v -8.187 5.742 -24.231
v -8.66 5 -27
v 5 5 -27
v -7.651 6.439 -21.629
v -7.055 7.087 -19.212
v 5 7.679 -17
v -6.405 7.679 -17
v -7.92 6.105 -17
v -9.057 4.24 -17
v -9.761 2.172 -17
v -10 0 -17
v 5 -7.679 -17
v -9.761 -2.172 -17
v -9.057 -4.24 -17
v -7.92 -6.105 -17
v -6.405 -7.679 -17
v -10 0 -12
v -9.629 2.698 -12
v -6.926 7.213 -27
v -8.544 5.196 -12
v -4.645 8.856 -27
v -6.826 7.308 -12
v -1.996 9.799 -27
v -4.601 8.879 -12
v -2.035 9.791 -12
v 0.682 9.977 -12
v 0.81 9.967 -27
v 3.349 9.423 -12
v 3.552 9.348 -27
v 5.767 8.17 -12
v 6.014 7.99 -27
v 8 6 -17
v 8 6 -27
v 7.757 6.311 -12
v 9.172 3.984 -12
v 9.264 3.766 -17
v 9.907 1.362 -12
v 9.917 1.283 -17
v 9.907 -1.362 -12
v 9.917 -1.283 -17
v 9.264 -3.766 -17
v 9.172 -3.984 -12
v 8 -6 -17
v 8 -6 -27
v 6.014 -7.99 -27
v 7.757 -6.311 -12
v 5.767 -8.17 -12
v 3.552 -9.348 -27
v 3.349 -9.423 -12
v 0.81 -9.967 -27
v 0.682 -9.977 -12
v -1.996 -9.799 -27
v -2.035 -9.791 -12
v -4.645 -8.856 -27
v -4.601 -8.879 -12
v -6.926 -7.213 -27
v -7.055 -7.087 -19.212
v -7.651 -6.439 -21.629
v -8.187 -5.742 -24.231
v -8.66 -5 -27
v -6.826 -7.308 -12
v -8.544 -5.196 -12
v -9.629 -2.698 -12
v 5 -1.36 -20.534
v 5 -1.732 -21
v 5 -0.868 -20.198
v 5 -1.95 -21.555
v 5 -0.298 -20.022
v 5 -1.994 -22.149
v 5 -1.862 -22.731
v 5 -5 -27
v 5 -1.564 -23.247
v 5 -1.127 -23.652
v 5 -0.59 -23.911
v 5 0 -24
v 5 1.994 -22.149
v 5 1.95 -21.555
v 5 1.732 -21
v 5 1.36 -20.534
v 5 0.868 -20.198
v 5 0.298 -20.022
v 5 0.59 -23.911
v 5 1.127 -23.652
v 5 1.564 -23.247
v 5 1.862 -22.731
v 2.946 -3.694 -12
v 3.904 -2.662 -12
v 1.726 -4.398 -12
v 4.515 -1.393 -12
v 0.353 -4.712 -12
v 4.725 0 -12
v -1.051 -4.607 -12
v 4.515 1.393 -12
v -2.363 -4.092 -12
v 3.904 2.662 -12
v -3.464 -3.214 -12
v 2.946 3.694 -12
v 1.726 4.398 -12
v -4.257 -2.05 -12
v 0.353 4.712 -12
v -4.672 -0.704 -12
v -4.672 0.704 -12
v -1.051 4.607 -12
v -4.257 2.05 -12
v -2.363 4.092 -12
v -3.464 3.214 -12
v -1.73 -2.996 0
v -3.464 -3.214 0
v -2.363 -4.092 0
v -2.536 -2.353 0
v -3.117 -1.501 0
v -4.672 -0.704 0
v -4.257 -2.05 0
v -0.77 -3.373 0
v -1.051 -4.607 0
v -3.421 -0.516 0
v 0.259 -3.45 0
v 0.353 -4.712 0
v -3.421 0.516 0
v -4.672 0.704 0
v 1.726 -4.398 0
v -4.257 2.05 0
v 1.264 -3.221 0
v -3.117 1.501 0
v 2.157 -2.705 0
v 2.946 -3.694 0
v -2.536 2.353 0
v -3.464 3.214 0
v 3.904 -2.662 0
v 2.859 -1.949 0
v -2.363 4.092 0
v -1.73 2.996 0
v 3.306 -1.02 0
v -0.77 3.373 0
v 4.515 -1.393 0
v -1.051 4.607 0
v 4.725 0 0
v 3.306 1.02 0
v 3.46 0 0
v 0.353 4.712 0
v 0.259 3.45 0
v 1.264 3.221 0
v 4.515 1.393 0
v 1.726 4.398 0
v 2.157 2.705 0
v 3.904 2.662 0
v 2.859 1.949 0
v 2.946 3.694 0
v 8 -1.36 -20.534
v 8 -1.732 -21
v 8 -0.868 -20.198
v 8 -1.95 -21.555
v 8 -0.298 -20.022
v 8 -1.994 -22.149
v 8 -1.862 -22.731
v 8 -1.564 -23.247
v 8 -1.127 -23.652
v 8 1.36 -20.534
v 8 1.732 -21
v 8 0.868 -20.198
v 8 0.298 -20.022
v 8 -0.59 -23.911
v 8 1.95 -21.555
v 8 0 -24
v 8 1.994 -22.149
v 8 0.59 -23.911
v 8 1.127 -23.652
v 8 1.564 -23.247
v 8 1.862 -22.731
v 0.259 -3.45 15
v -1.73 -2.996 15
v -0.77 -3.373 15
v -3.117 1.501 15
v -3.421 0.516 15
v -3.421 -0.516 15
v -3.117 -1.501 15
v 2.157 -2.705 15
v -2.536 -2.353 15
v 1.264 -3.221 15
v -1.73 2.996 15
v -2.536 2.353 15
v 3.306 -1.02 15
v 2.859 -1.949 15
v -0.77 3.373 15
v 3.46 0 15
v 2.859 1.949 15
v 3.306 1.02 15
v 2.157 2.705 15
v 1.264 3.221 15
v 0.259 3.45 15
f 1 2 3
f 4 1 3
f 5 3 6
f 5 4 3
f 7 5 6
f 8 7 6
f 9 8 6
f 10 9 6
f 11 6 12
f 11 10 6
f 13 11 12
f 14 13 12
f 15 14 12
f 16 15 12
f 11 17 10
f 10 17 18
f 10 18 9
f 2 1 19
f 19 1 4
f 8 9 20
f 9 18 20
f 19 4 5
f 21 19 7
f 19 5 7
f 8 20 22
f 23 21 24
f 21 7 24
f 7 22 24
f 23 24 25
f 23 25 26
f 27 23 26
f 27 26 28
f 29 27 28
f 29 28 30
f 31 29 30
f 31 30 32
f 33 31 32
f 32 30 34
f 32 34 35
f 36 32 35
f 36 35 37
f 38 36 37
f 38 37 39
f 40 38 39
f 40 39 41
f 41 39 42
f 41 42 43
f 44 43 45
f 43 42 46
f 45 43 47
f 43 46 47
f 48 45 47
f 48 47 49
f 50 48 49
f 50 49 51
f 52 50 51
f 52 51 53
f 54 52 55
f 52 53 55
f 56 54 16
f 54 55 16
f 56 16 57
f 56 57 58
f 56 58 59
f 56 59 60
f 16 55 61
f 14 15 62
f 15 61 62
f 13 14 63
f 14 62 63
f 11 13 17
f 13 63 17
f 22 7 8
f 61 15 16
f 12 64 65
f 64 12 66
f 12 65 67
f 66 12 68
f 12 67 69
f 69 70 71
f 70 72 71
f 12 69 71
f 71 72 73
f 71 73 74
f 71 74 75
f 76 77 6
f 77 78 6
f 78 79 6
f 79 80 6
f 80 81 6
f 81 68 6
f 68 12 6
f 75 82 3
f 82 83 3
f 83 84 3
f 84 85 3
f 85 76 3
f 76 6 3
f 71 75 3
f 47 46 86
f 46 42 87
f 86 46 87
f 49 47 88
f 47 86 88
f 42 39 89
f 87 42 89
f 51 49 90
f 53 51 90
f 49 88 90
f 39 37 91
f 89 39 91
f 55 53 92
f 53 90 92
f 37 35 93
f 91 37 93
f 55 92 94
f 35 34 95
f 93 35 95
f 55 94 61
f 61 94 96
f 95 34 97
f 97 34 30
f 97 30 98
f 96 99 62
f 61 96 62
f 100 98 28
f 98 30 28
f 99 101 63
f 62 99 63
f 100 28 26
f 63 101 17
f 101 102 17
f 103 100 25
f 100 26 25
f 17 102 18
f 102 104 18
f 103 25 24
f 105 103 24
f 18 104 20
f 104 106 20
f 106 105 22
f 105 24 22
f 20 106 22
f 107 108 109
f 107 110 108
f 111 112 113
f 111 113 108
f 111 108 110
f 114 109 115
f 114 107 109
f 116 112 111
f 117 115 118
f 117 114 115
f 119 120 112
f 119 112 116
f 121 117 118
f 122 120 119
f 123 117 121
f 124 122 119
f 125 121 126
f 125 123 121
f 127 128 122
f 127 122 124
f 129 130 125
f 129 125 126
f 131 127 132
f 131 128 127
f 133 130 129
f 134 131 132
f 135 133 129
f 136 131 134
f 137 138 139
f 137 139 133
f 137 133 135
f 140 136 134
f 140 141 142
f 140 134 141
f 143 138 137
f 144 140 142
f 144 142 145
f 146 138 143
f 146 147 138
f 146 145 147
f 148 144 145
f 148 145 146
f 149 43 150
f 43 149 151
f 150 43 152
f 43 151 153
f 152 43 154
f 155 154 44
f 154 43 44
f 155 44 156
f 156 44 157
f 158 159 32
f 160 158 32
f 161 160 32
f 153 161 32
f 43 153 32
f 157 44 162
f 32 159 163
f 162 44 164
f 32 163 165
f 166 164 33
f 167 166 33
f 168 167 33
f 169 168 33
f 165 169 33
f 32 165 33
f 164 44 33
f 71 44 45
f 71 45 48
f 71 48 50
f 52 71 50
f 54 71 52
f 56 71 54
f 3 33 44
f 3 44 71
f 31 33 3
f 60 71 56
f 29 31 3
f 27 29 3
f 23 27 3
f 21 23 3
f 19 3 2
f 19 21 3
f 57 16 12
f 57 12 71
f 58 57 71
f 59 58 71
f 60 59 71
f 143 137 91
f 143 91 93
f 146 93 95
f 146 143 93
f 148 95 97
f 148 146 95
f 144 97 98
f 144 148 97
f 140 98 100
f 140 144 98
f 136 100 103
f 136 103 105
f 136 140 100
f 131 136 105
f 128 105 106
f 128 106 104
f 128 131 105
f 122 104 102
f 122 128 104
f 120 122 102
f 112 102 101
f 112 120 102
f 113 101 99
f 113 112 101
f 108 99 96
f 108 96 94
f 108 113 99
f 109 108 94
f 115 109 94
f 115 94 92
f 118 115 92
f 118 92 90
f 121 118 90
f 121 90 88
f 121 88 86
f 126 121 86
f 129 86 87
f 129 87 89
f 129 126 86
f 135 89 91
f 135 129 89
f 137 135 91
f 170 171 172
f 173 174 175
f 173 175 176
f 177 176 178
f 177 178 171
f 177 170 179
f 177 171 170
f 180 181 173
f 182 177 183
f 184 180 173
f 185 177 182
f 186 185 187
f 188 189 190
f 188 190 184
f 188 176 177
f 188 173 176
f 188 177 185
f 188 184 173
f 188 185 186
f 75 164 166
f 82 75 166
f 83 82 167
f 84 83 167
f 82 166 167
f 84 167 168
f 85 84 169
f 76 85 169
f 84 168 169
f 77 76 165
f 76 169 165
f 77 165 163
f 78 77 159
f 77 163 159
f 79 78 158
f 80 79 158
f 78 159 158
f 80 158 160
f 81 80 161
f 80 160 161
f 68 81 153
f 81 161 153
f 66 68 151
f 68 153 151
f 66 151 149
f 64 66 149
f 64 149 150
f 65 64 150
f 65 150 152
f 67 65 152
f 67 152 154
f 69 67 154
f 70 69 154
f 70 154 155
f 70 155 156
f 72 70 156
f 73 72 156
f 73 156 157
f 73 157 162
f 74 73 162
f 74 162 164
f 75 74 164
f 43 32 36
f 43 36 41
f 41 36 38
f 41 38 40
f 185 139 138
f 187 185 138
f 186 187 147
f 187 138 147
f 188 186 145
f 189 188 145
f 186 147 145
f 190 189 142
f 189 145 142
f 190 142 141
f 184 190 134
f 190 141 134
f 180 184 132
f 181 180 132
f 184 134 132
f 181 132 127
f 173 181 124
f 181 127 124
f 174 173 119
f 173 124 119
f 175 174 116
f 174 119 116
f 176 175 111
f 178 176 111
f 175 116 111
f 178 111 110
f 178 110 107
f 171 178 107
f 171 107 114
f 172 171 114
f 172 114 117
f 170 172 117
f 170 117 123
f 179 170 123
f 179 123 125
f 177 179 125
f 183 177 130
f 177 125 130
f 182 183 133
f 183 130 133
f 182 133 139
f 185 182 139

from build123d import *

# Parameters (mm, degrees)
SKETCH1_R               = 4.725
BOSS_EXTRUDE1_DEPTH     = 12
SKETCH2_R               = 3.46
BOSS_EXTRUDE2_DEPTH     = 15
SKETCH5_R               = 10
BOSS_EXTRUDE3_DEPTH     = 15
CUT_EXTRUDE1_DEPTH      = 5
CUT_EXTRUDE1_DEPTH_BACK = 15
SKETCH4_W               = 2
SKETCH4_H               = 12
CUT_EXTRUDE2_DEPTH      = 10
CUT_EXTRUDE3_REACH      = 35.956
SKETCH6_R               = 2


with BuildPart() as part:
    # Sketch1 → Boss-Extrude1 (new body)
    with BuildSketch(Plane.XY):
        Circle(SKETCH1_R)
    extrude(amount=-BOSS_EXTRUDE1_DEPTH)

    # Sketch2 → Boss-Extrude2 (add)
    with BuildSketch(Plane.XY):
        Circle(SKETCH2_R)
    extrude(amount=BOSS_EXTRUDE2_DEPTH)

    # Sketch5 → Boss-Extrude3 (add)
    with BuildSketch(Plane(origin=(0, 0, -12), x_dir=(-1, 0, 0), z_dir=(0, 0, -1))):
        Circle(SKETCH5_R)
    extrude(amount=BOSS_EXTRUDE3_DEPTH)

    # Sketch3 → Cut-Extrude1 (cut, two sides: drawn at the far end of the back side and taken through both)
    with BuildSketch(Plane(origin=(0, 0, 0), x_dir=(0, 0, -1), z_dir=(1, 0, 0)).offset(-CUT_EXTRUDE1_DEPTH_BACK)):
        Polygon((27, -5), (27, 5), (17, 7.679491924), (17, -7.679491924), align=None)
    extrude(amount=CUT_EXTRUDE1_DEPTH + CUT_EXTRUDE1_DEPTH_BACK, mode=Mode.SUBTRACT)

    # Sketch4 → Cut-Extrude2 (cut)
    with BuildSketch(Plane(origin=(0, 0, -27), x_dir=(-1, 0, 0), z_dir=(0, 0, -1))):
        with Locations((-9, 0)):
            Rectangle(SKETCH4_W, SKETCH4_H)
    extrude(amount=-CUT_EXTRUDE2_DEPTH, mode=Mode.SUBTRACT)

    # Sketch6 → Cut-Extrude3 (cut, up to next)
    with BuildSketch(Plane(origin=(8, 0, 0), x_dir=(0, 0, -1), z_dir=(1, 0, 0)), mode=Mode.PRIVATE) as cut_extrude3_sk1:
        with Locations((22, 0)):
            Circle(SKETCH6_R)
    cut_extrude3_tool1 = extrude(cut_extrude3_sk1.sketch, amount=-CUT_EXTRUDE3_REACH, mode=Mode.PRIVATE) & part.part
    add(cut_extrude3_tool1.solids().sort_by_distance((8, 0, -22))[0], mode=Mode.SUBTRACT)


solid = part.part
